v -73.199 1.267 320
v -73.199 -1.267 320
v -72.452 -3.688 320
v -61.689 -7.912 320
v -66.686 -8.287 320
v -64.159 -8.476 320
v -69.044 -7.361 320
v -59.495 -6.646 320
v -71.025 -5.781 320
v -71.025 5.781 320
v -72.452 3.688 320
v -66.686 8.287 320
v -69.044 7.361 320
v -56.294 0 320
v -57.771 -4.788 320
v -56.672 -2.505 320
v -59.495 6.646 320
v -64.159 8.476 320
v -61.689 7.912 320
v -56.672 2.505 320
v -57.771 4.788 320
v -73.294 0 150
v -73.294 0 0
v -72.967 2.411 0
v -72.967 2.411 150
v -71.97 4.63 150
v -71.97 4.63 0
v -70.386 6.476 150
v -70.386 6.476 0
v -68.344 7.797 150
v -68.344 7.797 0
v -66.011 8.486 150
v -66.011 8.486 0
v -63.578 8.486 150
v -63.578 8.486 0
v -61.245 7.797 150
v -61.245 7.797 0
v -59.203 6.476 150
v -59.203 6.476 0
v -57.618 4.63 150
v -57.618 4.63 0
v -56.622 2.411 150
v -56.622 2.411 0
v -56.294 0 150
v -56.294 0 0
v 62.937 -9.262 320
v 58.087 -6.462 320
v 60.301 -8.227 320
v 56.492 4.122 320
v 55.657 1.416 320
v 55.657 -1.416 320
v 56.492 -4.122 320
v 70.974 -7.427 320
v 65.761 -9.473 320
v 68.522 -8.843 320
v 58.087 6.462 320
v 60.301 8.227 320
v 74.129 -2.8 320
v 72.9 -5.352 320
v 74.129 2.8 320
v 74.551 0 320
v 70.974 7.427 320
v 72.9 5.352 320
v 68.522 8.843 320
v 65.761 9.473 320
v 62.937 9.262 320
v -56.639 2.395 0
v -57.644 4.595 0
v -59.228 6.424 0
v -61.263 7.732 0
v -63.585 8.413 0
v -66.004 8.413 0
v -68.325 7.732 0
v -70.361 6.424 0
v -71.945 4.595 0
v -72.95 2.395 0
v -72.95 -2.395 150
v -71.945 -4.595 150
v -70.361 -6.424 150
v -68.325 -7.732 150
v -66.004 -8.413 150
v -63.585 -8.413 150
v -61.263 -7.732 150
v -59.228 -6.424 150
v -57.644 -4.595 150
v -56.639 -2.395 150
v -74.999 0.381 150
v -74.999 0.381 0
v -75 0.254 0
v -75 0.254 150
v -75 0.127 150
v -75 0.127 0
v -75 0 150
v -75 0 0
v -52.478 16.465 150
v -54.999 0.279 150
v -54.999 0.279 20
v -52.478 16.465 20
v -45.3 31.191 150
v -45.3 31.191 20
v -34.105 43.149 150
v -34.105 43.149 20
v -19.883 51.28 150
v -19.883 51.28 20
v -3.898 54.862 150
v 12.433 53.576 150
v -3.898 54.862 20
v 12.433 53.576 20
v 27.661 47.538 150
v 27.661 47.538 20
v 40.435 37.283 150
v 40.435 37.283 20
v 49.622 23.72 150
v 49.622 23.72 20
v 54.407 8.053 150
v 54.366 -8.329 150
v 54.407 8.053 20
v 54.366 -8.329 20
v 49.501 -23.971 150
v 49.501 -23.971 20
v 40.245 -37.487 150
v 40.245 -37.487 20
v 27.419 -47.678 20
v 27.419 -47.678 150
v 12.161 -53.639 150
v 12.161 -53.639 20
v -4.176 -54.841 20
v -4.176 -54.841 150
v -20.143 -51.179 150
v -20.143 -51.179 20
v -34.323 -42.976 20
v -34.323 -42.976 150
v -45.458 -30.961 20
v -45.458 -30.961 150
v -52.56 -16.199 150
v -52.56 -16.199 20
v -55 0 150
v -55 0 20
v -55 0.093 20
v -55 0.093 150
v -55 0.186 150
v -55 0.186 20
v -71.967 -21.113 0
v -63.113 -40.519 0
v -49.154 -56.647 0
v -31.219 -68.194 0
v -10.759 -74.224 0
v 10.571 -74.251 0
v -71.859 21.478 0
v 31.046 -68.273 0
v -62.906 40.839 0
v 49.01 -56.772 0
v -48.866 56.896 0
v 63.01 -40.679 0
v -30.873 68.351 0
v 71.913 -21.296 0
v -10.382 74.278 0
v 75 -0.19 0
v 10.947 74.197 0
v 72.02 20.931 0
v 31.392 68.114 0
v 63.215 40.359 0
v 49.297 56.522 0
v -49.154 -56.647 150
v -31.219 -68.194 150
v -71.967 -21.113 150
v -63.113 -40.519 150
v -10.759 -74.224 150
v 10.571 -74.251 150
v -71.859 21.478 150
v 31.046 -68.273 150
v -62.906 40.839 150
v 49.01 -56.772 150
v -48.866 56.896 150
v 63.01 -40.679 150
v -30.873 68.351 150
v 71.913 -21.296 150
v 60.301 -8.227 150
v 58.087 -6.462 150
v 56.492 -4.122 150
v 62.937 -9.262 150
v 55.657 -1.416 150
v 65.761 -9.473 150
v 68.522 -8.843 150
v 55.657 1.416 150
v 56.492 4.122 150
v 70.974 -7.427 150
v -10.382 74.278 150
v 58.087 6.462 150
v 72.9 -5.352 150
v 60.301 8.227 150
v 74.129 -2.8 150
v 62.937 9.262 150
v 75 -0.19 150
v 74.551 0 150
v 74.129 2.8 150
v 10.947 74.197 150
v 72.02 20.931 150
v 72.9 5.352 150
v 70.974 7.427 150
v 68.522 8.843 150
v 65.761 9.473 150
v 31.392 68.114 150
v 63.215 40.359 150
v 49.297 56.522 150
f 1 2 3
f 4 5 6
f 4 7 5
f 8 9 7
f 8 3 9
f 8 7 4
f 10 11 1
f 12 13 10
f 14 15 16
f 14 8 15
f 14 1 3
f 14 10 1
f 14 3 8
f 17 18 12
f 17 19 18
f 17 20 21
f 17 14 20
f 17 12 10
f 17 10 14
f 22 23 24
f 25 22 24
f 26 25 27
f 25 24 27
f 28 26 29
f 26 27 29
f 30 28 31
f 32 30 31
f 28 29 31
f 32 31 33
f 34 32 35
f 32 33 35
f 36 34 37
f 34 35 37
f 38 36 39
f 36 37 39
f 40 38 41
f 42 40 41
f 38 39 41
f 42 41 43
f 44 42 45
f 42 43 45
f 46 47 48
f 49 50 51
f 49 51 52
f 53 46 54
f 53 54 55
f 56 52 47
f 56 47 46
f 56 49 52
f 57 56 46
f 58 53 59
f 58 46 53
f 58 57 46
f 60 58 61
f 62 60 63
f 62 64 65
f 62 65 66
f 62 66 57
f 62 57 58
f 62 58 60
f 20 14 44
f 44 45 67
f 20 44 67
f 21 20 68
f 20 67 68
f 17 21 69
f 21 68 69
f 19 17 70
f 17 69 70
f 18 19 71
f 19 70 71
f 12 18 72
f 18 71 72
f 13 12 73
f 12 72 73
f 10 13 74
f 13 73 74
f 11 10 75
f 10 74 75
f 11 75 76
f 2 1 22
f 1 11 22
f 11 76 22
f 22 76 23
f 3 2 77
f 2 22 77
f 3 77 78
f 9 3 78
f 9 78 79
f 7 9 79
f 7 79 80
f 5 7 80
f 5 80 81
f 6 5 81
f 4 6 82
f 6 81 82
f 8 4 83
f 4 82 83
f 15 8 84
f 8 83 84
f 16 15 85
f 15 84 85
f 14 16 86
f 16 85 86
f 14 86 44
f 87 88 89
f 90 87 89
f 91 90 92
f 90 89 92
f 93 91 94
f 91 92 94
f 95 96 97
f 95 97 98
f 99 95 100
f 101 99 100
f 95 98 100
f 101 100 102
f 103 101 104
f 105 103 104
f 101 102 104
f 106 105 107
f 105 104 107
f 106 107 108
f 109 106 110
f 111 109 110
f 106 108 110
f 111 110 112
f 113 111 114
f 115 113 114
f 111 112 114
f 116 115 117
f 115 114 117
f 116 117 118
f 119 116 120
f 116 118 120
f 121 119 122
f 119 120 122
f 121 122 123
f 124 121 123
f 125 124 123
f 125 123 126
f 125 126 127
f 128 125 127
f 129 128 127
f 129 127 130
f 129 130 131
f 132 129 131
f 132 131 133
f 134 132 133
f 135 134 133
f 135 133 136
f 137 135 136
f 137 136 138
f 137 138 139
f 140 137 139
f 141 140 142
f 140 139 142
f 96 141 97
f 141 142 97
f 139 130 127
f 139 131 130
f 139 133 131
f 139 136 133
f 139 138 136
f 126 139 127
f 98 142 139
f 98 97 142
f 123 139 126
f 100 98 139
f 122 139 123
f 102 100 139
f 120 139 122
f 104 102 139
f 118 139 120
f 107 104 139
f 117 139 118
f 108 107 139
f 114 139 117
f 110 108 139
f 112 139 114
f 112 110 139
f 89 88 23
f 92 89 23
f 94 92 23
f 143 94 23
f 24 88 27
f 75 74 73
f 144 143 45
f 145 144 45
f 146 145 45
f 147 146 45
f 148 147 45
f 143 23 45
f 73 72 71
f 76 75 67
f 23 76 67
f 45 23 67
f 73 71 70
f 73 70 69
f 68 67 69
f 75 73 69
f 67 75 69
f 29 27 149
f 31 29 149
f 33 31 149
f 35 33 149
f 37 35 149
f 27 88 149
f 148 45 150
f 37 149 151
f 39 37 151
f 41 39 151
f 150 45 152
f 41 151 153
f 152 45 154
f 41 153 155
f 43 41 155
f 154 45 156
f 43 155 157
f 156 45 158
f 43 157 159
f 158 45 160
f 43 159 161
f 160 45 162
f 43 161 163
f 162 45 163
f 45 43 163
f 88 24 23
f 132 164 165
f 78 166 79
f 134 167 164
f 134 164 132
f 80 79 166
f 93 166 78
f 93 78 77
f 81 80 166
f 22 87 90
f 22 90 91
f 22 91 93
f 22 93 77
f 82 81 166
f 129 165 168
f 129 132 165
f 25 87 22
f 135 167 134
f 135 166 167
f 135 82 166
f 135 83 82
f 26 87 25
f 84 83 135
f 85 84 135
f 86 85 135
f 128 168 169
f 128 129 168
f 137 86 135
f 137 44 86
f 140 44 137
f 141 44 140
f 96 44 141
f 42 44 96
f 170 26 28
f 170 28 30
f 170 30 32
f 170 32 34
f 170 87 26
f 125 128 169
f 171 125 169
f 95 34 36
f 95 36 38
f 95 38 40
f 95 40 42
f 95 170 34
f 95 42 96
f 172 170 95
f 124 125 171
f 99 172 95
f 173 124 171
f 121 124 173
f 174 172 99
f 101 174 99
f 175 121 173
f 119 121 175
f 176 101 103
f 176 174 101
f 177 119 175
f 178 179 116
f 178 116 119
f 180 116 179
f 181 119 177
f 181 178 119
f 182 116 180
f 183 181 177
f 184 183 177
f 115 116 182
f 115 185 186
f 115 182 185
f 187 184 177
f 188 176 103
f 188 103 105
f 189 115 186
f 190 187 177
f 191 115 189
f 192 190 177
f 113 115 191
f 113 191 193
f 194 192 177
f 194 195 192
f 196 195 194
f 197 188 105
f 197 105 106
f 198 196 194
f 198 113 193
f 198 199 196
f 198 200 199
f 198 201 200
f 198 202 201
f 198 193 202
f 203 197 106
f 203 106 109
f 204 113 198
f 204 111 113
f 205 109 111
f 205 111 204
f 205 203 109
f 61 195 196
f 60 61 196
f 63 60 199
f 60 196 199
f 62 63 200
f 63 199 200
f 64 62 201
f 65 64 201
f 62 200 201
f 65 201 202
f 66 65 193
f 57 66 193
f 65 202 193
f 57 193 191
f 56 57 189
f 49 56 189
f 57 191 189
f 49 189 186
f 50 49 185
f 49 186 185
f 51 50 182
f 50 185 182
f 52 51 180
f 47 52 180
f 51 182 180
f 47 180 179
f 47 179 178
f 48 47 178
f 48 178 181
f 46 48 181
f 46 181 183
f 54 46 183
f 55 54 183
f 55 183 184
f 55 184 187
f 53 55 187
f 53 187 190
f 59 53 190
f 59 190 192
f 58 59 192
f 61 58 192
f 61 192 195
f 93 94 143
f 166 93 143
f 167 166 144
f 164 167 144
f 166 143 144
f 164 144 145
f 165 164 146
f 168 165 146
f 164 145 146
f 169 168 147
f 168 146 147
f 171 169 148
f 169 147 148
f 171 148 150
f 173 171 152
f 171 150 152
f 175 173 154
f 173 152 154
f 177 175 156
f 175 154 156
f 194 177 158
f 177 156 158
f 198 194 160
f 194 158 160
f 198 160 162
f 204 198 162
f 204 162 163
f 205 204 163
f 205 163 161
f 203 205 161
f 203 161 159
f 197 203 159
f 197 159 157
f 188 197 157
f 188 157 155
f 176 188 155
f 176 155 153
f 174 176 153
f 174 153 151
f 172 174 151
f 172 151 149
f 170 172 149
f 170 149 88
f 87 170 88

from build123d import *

# Parameters (mm, degrees)
F0_R     = 9.5
F1_DEPTH = 150
F2_DEPTH = 20
F3_DEPTH = 20
F4_DEPTH = 300
F5_DEPTH = 300


with BuildPart() as f1:
    # F0 (on Top) → F1 (new body)
    with BuildSketch(Plane.XY):
        with BuildLine():
            ThreePointArc((-74.9990347614, 0.3805060562), (-74.99975869, 0.1902536402), (-75, 0))
            ThreePointArc((-75, 0), (0, -75), (75, 0))
            ThreePointArc((75, 0), (0.1902536402, 74.99975869), (-74.9990347614, 0.3805060562))
        make_face()
        with BuildLine():
            ThreePointArc((-73.2942603105, 0), (-64.7942603105, 8.5738779646), (-56.2942603105, 0))
            ThreePointArc((-56.2942603105, 0), (-64.7942603105, -8.5), (-73.2942603105, 0))
        make_face(mode=Mode.SUBTRACT)
        with BuildLine():
            ThreePointArc((-55, 0), (-54.9998230393, 0.1395193362), (-54.9992921584, 0.2790377745))
            ThreePointArc((-54.9992921584, 0.2790377745), (0.1395193362, 54.9998230393), (55, 0))
            ThreePointArc((55, 0), (0, -55), (-55, 0))
        make_face(mode=Mode.SUBTRACT)
        with Locations((65.0509051438, 0)):
            Circle(F0_R, mode=Mode.SUBTRACT)
    extrude(amount=F1_DEPTH)

    # F0 (on Top) → F2 (join)
    with BuildSketch(Plane.XY):
        with BuildLine():
            ThreePointArc((-74.9990347614, 0.3805060562), (-74.99975869, 0.1902536402), (-75, 0))
            ThreePointArc((-75, 0), (0, -75), (75, 0))
            ThreePointArc((75, 0), (0.1902536402, 74.99975869), (-74.9990347614, 0.3805060562))
        make_face()
        with BuildLine():
            ThreePointArc((-73.2942603105, 0), (-64.7942603105, 8.5738779646), (-56.2942603105, 0))
            ThreePointArc((-56.2942603105, 0), (-64.7942603105, -8.5), (-73.2942603105, 0))
        make_face(mode=Mode.SUBTRACT)
        with BuildLine():
            ThreePointArc((-55, 0), (-54.9998230393, 0.1395193362), (-54.9992921584, 0.2790377745))
            ThreePointArc((-54.9992921584, 0.2790377745), (0.1395193362, 54.9998230393), (55, 0))
            ThreePointArc((55, 0), (0, -55), (-55, 0))
        make_face(mode=Mode.SUBTRACT)
        with Locations((65.0509051438, 0)):
            Circle(F0_R, mode=Mode.SUBTRACT)
        with BuildLine():
            ThreePointArc((-55, 0), (-54.998672885, 0.1395164185), (-54.9992921584, 0.2790377745))
            ThreePointArc((-54.9992921584, 0.2790377745), (-54.9998230393, 0.1395193362), (-55, 0))
        make_face()
        with BuildLine():
            ThreePointArc((55, 0), (0.1395193362, 54.9998230393), (-54.9992921584, 0.2790377745))
            ThreePointArc((-54.9992921584, 0.2790377745), (-54.998672885, 0.1395164185), (-55, 0))
            ThreePointArc((-55, 0), (0, -55), (55, 0))
        make_face()
    extrude(amount=F2_DEPTH)

    # F0 (on Top) → F3 (join)
    with BuildSketch(Plane.XY):
        with BuildLine():
            ThreePointArc((-73.2942603105, 0), (-64.7942603105, -8.5), (-56.2942603105, 0))
            ThreePointArc((-56.2942603105, 0), (-64.7942603105, 8.5), (-73.2942603105, 0))
        make_face()
        with Locations((65.0509051438, 0)):
            Circle(F0_R)
    extrude(amount=F3_DEPTH)

    # F4 (add): a face of the model
    f4_faces = [f1.faces().sort_by_distance(p)[0] for p in [
        (-64.7942603105, 0, 20),
    ]]
    extrude(f4_faces, amount=F4_DEPTH)

    # F5 (add): a face of the model
    f5_faces = [f1.faces().sort_by_distance(p)[0] for p in [
        (65.0509051438, 0, 20),
    ]]
    extrude(f5_faces, amount=F5_DEPTH)


solid = f1.part
